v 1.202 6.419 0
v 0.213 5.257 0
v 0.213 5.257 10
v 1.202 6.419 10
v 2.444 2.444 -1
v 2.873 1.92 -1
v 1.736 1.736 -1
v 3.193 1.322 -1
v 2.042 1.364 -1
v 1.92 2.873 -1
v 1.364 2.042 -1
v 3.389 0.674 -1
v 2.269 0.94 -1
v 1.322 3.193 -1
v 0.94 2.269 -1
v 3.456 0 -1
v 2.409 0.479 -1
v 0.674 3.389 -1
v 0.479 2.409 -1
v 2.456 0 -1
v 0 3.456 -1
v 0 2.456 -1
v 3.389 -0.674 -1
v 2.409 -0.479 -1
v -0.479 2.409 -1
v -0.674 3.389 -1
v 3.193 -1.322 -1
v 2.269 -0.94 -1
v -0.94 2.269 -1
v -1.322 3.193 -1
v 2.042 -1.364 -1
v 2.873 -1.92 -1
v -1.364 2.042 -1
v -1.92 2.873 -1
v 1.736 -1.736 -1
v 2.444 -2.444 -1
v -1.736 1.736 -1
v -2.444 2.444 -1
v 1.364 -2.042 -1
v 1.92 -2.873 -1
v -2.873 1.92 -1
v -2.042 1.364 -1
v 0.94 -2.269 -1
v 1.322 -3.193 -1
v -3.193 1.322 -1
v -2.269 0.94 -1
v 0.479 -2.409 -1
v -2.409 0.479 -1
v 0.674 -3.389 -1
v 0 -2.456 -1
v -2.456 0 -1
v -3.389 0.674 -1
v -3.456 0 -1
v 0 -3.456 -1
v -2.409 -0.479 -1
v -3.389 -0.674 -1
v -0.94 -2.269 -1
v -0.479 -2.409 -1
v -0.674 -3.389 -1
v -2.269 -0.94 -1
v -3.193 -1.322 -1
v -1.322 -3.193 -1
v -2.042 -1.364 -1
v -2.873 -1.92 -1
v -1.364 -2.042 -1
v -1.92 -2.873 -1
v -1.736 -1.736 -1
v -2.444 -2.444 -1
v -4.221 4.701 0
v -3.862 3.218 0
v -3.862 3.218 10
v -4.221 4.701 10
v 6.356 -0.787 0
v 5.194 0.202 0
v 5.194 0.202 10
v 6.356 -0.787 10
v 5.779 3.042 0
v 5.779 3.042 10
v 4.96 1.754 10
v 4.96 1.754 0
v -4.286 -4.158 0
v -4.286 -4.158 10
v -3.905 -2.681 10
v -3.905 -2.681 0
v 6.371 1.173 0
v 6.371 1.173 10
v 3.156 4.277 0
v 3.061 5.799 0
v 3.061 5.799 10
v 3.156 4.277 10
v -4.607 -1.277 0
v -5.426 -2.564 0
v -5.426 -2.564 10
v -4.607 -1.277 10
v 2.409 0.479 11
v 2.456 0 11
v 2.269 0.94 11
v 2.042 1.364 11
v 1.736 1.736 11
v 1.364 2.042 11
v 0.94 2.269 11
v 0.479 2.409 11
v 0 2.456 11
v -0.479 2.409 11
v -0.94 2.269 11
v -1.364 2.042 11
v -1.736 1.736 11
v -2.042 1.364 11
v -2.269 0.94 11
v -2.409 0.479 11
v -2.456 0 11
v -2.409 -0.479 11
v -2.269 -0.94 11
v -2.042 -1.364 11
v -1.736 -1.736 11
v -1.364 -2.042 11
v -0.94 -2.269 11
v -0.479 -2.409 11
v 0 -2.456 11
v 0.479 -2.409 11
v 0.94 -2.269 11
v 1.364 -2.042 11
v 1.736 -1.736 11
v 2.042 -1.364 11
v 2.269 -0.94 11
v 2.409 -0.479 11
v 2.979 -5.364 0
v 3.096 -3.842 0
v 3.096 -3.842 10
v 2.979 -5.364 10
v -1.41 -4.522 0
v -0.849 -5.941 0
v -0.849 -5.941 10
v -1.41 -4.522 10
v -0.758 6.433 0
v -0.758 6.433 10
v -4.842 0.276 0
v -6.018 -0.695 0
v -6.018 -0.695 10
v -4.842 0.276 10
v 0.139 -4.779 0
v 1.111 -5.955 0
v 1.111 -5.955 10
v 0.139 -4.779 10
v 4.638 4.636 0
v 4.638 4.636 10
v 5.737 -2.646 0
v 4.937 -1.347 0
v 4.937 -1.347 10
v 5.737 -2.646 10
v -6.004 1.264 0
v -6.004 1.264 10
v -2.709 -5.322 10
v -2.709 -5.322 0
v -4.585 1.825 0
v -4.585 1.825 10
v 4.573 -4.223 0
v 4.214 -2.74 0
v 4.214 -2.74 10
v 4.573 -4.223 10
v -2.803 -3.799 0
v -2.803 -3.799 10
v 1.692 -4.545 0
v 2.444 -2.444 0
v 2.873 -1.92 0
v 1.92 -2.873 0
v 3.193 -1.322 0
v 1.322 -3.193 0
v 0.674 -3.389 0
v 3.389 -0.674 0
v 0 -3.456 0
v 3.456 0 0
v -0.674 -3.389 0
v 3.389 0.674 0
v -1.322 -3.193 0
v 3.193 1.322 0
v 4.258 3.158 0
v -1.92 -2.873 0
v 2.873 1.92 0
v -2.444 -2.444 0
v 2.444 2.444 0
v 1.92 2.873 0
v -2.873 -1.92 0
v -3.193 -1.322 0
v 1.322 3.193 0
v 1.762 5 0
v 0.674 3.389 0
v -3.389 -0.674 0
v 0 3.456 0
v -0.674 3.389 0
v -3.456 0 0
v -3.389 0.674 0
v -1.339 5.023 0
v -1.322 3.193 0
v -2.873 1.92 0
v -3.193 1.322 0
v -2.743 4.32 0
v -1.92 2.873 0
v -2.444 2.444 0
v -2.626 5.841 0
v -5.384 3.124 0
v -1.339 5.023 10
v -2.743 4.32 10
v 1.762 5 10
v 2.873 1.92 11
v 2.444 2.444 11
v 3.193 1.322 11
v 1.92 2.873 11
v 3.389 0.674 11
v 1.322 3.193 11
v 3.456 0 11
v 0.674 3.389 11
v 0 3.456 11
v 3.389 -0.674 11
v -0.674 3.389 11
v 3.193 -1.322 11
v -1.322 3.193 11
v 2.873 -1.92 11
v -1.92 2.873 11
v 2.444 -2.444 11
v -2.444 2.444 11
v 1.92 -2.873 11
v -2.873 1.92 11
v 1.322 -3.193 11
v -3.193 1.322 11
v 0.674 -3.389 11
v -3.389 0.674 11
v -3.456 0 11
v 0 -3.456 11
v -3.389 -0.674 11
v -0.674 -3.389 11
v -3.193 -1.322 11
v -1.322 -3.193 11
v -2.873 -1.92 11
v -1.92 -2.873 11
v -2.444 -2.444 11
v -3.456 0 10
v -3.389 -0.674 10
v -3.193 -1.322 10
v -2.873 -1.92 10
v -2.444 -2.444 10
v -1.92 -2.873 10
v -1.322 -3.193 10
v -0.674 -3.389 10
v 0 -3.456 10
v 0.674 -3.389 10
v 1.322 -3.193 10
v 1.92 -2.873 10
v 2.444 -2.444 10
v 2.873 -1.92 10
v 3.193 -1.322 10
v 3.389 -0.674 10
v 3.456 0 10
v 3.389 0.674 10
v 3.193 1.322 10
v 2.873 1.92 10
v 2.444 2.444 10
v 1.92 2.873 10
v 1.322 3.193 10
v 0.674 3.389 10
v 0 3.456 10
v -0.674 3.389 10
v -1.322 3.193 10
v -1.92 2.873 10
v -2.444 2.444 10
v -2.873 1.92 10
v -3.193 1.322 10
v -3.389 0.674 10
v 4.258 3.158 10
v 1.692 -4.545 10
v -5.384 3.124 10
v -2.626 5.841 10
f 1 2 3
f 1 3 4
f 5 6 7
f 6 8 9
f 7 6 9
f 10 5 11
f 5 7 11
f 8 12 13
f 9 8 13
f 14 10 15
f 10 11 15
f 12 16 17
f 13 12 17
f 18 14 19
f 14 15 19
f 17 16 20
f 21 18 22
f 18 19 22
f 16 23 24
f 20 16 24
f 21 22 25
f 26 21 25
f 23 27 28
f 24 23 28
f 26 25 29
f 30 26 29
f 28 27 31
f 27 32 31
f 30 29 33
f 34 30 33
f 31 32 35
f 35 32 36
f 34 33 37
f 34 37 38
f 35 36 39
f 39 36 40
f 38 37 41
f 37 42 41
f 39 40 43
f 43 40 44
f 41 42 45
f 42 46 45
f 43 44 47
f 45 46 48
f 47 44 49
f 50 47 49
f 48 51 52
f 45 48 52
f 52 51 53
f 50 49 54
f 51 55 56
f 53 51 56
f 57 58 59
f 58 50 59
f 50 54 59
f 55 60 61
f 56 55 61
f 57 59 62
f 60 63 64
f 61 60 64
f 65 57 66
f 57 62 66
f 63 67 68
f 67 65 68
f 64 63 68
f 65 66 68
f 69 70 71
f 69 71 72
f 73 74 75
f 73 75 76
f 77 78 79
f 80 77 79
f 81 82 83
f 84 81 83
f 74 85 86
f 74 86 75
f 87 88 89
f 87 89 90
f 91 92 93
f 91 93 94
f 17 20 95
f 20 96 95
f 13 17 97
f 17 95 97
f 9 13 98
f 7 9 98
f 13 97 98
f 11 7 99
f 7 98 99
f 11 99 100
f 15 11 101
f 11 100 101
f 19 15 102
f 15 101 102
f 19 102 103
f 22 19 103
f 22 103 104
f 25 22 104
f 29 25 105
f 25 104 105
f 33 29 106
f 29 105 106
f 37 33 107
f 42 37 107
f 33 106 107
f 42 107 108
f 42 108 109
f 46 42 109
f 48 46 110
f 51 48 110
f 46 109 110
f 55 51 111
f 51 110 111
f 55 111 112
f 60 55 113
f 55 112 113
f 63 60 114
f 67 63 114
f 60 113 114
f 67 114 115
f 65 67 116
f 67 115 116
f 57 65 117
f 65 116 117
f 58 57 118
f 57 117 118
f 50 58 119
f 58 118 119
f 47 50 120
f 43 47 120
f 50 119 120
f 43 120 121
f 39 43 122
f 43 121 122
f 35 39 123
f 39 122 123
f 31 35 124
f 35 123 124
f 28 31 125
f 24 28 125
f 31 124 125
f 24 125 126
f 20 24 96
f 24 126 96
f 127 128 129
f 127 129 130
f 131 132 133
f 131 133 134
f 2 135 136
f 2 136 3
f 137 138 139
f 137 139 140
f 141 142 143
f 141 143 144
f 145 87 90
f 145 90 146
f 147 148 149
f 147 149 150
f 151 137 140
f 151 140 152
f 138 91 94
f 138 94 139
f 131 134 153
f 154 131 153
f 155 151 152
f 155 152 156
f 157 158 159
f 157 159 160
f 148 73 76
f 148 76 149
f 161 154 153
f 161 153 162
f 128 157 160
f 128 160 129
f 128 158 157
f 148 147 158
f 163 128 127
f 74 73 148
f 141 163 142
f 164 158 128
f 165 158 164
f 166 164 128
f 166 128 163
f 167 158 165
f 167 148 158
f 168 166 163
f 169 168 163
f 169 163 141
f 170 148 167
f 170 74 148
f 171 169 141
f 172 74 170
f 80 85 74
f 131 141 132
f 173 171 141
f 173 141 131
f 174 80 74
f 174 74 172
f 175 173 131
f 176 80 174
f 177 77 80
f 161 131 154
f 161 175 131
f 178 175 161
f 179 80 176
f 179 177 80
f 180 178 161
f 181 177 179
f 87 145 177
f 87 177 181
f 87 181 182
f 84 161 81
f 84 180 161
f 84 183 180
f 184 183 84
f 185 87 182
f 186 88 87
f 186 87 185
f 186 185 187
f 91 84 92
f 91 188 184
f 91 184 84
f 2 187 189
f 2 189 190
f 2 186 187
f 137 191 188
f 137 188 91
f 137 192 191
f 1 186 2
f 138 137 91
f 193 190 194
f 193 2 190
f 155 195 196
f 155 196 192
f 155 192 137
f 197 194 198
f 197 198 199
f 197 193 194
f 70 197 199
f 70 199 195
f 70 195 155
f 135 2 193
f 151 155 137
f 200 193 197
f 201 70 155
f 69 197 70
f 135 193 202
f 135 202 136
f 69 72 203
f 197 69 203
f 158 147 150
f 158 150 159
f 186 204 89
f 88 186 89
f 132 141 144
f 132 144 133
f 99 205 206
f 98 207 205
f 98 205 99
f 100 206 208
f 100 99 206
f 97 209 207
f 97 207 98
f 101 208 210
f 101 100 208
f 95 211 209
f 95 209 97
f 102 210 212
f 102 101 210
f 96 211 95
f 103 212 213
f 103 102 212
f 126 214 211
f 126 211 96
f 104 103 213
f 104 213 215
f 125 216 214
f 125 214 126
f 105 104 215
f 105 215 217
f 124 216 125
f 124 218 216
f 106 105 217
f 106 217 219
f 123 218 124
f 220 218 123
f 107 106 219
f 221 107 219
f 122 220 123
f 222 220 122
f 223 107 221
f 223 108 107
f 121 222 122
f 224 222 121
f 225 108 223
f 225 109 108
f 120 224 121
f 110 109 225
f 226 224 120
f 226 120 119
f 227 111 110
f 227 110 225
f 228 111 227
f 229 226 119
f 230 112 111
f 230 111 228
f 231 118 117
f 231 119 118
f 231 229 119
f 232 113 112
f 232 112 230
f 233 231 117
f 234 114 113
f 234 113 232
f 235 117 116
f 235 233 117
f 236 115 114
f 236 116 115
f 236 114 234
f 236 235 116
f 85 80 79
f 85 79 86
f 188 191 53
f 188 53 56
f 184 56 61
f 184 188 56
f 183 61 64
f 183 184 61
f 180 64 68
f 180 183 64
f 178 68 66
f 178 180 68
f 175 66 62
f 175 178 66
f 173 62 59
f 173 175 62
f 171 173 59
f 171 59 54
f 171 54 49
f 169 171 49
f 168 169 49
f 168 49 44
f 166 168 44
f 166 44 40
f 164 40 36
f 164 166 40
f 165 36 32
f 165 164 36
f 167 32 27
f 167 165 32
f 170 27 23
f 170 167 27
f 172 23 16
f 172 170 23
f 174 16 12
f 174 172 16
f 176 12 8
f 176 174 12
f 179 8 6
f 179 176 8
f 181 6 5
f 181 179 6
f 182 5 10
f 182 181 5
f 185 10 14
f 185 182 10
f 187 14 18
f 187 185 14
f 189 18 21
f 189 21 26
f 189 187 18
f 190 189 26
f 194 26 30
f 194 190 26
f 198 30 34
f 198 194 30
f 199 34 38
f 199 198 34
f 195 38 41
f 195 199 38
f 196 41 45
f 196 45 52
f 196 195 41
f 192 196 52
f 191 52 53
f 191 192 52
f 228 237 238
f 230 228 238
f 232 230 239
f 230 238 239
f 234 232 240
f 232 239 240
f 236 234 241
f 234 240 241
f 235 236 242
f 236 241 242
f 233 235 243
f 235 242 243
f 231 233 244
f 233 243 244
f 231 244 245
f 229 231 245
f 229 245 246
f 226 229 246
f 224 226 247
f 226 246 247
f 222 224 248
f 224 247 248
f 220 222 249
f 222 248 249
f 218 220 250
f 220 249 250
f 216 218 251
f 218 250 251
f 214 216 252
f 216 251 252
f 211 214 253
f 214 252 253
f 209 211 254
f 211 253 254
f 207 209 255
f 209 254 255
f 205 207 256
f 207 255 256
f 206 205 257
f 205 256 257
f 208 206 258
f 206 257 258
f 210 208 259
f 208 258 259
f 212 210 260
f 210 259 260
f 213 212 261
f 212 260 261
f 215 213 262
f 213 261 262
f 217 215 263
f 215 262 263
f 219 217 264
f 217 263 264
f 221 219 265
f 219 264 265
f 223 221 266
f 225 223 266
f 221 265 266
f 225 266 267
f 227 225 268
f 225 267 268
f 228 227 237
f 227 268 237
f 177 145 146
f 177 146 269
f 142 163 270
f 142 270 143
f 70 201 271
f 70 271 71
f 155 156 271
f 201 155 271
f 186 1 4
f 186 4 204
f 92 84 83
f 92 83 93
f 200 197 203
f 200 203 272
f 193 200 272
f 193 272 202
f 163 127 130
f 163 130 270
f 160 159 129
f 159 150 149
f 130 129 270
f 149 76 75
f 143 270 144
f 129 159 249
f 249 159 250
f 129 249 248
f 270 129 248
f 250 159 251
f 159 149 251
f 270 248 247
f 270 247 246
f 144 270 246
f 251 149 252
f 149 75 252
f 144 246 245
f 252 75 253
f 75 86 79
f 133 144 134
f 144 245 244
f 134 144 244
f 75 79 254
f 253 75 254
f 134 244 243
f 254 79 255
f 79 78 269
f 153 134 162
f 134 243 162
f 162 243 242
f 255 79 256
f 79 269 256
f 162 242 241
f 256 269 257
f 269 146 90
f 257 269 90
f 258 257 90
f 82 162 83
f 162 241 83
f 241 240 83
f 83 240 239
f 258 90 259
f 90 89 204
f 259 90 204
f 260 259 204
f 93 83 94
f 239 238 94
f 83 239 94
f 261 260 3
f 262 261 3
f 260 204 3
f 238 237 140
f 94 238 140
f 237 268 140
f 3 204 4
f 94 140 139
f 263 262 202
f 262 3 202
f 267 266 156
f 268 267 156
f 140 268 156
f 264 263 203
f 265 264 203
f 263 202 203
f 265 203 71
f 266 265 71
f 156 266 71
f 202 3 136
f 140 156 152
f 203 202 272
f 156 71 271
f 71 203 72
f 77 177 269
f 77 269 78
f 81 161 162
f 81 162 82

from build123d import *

# Parameters (mm, degrees)
SKETCH1_R           = 2.455762573
BOSS_EXTRUDE2_DEPTH = 10
SKETCH2_R           = 3.455762573
SKETCH2_R_2         = 2.455762573
BOSS_EXTRUDE3_DEPTH = 1


with BuildPart() as part:
    # Sketch1 → Boss-Extrude2 (new body)
    with BuildSketch(Plane.XY):
        Polygon((-1.339170865, 5.022694112), (-0.758059631, 6.433255275), (0.213267394, 5.256863813), (1.201824391, 6.418813952), (1.762086335, 4.999842629), (3.061322248, 5.799441968), (3.155676767, 4.276789583), (4.638413333, 4.635767768), (4.25762435, 3.158482146), (5.778720983, 3.041699891), (4.960062776, 1.75438804), (6.370623939, 1.173276806), (5.194232478, 0.20194978), (6.356182616, -0.786607217), (4.937211293, -1.346869161), (5.736810633, -2.646105074), (4.214158248, -2.740459593), (4.573136433, -4.223196159), (3.09585081, -3.842407175), (2.979068555, -5.363503808), (1.691756704, -4.544845601), (1.11064547, -5.955406764), (0.139318444, -4.779015303), (-0.849238553, -5.940965442), (-1.409500496, -4.521994119), (-2.708736409, -5.321593458), (-2.803090929, -3.798941073), (-4.285827494, -4.157919258), (-3.905038511, -2.680633635), (-5.426135144, -2.563851381), (-4.607476937, -1.27653953), (-6.0180381, -0.695428296), (-4.841646639, 0.27589873), (-6.003596778, 1.264455727), (-4.584625455, 1.824717671), (-5.384224794, 3.123953584), (-3.861572409, 3.218308103), (-4.220550594, 4.701044669), (-2.743264971, 4.320255686), (-2.626482716, 5.841352318), align=None)
        Circle(SKETCH1_R, mode=Mode.SUBTRACT)
    extrude(amount=BOSS_EXTRUDE2_DEPTH)

    # Sketch2 → Boss-Extrude3 (add)
    with BuildSketch(Plane.XY.offset(10)):
        with Locations(Location((0, 0, 0), (0, 0, 180))):
            Circle(SKETCH2_R)
        Circle(SKETCH2_R_2, mode=Mode.SUBTRACT)
    boss_extrude3 = extrude(amount=BOSS_EXTRUDE3_DEPTH)

    # Mirror1: Boss-Extrude3 across plane
    add(boss_extrude3.mirror(Plane.XY.offset(5)))


solid = part.part
